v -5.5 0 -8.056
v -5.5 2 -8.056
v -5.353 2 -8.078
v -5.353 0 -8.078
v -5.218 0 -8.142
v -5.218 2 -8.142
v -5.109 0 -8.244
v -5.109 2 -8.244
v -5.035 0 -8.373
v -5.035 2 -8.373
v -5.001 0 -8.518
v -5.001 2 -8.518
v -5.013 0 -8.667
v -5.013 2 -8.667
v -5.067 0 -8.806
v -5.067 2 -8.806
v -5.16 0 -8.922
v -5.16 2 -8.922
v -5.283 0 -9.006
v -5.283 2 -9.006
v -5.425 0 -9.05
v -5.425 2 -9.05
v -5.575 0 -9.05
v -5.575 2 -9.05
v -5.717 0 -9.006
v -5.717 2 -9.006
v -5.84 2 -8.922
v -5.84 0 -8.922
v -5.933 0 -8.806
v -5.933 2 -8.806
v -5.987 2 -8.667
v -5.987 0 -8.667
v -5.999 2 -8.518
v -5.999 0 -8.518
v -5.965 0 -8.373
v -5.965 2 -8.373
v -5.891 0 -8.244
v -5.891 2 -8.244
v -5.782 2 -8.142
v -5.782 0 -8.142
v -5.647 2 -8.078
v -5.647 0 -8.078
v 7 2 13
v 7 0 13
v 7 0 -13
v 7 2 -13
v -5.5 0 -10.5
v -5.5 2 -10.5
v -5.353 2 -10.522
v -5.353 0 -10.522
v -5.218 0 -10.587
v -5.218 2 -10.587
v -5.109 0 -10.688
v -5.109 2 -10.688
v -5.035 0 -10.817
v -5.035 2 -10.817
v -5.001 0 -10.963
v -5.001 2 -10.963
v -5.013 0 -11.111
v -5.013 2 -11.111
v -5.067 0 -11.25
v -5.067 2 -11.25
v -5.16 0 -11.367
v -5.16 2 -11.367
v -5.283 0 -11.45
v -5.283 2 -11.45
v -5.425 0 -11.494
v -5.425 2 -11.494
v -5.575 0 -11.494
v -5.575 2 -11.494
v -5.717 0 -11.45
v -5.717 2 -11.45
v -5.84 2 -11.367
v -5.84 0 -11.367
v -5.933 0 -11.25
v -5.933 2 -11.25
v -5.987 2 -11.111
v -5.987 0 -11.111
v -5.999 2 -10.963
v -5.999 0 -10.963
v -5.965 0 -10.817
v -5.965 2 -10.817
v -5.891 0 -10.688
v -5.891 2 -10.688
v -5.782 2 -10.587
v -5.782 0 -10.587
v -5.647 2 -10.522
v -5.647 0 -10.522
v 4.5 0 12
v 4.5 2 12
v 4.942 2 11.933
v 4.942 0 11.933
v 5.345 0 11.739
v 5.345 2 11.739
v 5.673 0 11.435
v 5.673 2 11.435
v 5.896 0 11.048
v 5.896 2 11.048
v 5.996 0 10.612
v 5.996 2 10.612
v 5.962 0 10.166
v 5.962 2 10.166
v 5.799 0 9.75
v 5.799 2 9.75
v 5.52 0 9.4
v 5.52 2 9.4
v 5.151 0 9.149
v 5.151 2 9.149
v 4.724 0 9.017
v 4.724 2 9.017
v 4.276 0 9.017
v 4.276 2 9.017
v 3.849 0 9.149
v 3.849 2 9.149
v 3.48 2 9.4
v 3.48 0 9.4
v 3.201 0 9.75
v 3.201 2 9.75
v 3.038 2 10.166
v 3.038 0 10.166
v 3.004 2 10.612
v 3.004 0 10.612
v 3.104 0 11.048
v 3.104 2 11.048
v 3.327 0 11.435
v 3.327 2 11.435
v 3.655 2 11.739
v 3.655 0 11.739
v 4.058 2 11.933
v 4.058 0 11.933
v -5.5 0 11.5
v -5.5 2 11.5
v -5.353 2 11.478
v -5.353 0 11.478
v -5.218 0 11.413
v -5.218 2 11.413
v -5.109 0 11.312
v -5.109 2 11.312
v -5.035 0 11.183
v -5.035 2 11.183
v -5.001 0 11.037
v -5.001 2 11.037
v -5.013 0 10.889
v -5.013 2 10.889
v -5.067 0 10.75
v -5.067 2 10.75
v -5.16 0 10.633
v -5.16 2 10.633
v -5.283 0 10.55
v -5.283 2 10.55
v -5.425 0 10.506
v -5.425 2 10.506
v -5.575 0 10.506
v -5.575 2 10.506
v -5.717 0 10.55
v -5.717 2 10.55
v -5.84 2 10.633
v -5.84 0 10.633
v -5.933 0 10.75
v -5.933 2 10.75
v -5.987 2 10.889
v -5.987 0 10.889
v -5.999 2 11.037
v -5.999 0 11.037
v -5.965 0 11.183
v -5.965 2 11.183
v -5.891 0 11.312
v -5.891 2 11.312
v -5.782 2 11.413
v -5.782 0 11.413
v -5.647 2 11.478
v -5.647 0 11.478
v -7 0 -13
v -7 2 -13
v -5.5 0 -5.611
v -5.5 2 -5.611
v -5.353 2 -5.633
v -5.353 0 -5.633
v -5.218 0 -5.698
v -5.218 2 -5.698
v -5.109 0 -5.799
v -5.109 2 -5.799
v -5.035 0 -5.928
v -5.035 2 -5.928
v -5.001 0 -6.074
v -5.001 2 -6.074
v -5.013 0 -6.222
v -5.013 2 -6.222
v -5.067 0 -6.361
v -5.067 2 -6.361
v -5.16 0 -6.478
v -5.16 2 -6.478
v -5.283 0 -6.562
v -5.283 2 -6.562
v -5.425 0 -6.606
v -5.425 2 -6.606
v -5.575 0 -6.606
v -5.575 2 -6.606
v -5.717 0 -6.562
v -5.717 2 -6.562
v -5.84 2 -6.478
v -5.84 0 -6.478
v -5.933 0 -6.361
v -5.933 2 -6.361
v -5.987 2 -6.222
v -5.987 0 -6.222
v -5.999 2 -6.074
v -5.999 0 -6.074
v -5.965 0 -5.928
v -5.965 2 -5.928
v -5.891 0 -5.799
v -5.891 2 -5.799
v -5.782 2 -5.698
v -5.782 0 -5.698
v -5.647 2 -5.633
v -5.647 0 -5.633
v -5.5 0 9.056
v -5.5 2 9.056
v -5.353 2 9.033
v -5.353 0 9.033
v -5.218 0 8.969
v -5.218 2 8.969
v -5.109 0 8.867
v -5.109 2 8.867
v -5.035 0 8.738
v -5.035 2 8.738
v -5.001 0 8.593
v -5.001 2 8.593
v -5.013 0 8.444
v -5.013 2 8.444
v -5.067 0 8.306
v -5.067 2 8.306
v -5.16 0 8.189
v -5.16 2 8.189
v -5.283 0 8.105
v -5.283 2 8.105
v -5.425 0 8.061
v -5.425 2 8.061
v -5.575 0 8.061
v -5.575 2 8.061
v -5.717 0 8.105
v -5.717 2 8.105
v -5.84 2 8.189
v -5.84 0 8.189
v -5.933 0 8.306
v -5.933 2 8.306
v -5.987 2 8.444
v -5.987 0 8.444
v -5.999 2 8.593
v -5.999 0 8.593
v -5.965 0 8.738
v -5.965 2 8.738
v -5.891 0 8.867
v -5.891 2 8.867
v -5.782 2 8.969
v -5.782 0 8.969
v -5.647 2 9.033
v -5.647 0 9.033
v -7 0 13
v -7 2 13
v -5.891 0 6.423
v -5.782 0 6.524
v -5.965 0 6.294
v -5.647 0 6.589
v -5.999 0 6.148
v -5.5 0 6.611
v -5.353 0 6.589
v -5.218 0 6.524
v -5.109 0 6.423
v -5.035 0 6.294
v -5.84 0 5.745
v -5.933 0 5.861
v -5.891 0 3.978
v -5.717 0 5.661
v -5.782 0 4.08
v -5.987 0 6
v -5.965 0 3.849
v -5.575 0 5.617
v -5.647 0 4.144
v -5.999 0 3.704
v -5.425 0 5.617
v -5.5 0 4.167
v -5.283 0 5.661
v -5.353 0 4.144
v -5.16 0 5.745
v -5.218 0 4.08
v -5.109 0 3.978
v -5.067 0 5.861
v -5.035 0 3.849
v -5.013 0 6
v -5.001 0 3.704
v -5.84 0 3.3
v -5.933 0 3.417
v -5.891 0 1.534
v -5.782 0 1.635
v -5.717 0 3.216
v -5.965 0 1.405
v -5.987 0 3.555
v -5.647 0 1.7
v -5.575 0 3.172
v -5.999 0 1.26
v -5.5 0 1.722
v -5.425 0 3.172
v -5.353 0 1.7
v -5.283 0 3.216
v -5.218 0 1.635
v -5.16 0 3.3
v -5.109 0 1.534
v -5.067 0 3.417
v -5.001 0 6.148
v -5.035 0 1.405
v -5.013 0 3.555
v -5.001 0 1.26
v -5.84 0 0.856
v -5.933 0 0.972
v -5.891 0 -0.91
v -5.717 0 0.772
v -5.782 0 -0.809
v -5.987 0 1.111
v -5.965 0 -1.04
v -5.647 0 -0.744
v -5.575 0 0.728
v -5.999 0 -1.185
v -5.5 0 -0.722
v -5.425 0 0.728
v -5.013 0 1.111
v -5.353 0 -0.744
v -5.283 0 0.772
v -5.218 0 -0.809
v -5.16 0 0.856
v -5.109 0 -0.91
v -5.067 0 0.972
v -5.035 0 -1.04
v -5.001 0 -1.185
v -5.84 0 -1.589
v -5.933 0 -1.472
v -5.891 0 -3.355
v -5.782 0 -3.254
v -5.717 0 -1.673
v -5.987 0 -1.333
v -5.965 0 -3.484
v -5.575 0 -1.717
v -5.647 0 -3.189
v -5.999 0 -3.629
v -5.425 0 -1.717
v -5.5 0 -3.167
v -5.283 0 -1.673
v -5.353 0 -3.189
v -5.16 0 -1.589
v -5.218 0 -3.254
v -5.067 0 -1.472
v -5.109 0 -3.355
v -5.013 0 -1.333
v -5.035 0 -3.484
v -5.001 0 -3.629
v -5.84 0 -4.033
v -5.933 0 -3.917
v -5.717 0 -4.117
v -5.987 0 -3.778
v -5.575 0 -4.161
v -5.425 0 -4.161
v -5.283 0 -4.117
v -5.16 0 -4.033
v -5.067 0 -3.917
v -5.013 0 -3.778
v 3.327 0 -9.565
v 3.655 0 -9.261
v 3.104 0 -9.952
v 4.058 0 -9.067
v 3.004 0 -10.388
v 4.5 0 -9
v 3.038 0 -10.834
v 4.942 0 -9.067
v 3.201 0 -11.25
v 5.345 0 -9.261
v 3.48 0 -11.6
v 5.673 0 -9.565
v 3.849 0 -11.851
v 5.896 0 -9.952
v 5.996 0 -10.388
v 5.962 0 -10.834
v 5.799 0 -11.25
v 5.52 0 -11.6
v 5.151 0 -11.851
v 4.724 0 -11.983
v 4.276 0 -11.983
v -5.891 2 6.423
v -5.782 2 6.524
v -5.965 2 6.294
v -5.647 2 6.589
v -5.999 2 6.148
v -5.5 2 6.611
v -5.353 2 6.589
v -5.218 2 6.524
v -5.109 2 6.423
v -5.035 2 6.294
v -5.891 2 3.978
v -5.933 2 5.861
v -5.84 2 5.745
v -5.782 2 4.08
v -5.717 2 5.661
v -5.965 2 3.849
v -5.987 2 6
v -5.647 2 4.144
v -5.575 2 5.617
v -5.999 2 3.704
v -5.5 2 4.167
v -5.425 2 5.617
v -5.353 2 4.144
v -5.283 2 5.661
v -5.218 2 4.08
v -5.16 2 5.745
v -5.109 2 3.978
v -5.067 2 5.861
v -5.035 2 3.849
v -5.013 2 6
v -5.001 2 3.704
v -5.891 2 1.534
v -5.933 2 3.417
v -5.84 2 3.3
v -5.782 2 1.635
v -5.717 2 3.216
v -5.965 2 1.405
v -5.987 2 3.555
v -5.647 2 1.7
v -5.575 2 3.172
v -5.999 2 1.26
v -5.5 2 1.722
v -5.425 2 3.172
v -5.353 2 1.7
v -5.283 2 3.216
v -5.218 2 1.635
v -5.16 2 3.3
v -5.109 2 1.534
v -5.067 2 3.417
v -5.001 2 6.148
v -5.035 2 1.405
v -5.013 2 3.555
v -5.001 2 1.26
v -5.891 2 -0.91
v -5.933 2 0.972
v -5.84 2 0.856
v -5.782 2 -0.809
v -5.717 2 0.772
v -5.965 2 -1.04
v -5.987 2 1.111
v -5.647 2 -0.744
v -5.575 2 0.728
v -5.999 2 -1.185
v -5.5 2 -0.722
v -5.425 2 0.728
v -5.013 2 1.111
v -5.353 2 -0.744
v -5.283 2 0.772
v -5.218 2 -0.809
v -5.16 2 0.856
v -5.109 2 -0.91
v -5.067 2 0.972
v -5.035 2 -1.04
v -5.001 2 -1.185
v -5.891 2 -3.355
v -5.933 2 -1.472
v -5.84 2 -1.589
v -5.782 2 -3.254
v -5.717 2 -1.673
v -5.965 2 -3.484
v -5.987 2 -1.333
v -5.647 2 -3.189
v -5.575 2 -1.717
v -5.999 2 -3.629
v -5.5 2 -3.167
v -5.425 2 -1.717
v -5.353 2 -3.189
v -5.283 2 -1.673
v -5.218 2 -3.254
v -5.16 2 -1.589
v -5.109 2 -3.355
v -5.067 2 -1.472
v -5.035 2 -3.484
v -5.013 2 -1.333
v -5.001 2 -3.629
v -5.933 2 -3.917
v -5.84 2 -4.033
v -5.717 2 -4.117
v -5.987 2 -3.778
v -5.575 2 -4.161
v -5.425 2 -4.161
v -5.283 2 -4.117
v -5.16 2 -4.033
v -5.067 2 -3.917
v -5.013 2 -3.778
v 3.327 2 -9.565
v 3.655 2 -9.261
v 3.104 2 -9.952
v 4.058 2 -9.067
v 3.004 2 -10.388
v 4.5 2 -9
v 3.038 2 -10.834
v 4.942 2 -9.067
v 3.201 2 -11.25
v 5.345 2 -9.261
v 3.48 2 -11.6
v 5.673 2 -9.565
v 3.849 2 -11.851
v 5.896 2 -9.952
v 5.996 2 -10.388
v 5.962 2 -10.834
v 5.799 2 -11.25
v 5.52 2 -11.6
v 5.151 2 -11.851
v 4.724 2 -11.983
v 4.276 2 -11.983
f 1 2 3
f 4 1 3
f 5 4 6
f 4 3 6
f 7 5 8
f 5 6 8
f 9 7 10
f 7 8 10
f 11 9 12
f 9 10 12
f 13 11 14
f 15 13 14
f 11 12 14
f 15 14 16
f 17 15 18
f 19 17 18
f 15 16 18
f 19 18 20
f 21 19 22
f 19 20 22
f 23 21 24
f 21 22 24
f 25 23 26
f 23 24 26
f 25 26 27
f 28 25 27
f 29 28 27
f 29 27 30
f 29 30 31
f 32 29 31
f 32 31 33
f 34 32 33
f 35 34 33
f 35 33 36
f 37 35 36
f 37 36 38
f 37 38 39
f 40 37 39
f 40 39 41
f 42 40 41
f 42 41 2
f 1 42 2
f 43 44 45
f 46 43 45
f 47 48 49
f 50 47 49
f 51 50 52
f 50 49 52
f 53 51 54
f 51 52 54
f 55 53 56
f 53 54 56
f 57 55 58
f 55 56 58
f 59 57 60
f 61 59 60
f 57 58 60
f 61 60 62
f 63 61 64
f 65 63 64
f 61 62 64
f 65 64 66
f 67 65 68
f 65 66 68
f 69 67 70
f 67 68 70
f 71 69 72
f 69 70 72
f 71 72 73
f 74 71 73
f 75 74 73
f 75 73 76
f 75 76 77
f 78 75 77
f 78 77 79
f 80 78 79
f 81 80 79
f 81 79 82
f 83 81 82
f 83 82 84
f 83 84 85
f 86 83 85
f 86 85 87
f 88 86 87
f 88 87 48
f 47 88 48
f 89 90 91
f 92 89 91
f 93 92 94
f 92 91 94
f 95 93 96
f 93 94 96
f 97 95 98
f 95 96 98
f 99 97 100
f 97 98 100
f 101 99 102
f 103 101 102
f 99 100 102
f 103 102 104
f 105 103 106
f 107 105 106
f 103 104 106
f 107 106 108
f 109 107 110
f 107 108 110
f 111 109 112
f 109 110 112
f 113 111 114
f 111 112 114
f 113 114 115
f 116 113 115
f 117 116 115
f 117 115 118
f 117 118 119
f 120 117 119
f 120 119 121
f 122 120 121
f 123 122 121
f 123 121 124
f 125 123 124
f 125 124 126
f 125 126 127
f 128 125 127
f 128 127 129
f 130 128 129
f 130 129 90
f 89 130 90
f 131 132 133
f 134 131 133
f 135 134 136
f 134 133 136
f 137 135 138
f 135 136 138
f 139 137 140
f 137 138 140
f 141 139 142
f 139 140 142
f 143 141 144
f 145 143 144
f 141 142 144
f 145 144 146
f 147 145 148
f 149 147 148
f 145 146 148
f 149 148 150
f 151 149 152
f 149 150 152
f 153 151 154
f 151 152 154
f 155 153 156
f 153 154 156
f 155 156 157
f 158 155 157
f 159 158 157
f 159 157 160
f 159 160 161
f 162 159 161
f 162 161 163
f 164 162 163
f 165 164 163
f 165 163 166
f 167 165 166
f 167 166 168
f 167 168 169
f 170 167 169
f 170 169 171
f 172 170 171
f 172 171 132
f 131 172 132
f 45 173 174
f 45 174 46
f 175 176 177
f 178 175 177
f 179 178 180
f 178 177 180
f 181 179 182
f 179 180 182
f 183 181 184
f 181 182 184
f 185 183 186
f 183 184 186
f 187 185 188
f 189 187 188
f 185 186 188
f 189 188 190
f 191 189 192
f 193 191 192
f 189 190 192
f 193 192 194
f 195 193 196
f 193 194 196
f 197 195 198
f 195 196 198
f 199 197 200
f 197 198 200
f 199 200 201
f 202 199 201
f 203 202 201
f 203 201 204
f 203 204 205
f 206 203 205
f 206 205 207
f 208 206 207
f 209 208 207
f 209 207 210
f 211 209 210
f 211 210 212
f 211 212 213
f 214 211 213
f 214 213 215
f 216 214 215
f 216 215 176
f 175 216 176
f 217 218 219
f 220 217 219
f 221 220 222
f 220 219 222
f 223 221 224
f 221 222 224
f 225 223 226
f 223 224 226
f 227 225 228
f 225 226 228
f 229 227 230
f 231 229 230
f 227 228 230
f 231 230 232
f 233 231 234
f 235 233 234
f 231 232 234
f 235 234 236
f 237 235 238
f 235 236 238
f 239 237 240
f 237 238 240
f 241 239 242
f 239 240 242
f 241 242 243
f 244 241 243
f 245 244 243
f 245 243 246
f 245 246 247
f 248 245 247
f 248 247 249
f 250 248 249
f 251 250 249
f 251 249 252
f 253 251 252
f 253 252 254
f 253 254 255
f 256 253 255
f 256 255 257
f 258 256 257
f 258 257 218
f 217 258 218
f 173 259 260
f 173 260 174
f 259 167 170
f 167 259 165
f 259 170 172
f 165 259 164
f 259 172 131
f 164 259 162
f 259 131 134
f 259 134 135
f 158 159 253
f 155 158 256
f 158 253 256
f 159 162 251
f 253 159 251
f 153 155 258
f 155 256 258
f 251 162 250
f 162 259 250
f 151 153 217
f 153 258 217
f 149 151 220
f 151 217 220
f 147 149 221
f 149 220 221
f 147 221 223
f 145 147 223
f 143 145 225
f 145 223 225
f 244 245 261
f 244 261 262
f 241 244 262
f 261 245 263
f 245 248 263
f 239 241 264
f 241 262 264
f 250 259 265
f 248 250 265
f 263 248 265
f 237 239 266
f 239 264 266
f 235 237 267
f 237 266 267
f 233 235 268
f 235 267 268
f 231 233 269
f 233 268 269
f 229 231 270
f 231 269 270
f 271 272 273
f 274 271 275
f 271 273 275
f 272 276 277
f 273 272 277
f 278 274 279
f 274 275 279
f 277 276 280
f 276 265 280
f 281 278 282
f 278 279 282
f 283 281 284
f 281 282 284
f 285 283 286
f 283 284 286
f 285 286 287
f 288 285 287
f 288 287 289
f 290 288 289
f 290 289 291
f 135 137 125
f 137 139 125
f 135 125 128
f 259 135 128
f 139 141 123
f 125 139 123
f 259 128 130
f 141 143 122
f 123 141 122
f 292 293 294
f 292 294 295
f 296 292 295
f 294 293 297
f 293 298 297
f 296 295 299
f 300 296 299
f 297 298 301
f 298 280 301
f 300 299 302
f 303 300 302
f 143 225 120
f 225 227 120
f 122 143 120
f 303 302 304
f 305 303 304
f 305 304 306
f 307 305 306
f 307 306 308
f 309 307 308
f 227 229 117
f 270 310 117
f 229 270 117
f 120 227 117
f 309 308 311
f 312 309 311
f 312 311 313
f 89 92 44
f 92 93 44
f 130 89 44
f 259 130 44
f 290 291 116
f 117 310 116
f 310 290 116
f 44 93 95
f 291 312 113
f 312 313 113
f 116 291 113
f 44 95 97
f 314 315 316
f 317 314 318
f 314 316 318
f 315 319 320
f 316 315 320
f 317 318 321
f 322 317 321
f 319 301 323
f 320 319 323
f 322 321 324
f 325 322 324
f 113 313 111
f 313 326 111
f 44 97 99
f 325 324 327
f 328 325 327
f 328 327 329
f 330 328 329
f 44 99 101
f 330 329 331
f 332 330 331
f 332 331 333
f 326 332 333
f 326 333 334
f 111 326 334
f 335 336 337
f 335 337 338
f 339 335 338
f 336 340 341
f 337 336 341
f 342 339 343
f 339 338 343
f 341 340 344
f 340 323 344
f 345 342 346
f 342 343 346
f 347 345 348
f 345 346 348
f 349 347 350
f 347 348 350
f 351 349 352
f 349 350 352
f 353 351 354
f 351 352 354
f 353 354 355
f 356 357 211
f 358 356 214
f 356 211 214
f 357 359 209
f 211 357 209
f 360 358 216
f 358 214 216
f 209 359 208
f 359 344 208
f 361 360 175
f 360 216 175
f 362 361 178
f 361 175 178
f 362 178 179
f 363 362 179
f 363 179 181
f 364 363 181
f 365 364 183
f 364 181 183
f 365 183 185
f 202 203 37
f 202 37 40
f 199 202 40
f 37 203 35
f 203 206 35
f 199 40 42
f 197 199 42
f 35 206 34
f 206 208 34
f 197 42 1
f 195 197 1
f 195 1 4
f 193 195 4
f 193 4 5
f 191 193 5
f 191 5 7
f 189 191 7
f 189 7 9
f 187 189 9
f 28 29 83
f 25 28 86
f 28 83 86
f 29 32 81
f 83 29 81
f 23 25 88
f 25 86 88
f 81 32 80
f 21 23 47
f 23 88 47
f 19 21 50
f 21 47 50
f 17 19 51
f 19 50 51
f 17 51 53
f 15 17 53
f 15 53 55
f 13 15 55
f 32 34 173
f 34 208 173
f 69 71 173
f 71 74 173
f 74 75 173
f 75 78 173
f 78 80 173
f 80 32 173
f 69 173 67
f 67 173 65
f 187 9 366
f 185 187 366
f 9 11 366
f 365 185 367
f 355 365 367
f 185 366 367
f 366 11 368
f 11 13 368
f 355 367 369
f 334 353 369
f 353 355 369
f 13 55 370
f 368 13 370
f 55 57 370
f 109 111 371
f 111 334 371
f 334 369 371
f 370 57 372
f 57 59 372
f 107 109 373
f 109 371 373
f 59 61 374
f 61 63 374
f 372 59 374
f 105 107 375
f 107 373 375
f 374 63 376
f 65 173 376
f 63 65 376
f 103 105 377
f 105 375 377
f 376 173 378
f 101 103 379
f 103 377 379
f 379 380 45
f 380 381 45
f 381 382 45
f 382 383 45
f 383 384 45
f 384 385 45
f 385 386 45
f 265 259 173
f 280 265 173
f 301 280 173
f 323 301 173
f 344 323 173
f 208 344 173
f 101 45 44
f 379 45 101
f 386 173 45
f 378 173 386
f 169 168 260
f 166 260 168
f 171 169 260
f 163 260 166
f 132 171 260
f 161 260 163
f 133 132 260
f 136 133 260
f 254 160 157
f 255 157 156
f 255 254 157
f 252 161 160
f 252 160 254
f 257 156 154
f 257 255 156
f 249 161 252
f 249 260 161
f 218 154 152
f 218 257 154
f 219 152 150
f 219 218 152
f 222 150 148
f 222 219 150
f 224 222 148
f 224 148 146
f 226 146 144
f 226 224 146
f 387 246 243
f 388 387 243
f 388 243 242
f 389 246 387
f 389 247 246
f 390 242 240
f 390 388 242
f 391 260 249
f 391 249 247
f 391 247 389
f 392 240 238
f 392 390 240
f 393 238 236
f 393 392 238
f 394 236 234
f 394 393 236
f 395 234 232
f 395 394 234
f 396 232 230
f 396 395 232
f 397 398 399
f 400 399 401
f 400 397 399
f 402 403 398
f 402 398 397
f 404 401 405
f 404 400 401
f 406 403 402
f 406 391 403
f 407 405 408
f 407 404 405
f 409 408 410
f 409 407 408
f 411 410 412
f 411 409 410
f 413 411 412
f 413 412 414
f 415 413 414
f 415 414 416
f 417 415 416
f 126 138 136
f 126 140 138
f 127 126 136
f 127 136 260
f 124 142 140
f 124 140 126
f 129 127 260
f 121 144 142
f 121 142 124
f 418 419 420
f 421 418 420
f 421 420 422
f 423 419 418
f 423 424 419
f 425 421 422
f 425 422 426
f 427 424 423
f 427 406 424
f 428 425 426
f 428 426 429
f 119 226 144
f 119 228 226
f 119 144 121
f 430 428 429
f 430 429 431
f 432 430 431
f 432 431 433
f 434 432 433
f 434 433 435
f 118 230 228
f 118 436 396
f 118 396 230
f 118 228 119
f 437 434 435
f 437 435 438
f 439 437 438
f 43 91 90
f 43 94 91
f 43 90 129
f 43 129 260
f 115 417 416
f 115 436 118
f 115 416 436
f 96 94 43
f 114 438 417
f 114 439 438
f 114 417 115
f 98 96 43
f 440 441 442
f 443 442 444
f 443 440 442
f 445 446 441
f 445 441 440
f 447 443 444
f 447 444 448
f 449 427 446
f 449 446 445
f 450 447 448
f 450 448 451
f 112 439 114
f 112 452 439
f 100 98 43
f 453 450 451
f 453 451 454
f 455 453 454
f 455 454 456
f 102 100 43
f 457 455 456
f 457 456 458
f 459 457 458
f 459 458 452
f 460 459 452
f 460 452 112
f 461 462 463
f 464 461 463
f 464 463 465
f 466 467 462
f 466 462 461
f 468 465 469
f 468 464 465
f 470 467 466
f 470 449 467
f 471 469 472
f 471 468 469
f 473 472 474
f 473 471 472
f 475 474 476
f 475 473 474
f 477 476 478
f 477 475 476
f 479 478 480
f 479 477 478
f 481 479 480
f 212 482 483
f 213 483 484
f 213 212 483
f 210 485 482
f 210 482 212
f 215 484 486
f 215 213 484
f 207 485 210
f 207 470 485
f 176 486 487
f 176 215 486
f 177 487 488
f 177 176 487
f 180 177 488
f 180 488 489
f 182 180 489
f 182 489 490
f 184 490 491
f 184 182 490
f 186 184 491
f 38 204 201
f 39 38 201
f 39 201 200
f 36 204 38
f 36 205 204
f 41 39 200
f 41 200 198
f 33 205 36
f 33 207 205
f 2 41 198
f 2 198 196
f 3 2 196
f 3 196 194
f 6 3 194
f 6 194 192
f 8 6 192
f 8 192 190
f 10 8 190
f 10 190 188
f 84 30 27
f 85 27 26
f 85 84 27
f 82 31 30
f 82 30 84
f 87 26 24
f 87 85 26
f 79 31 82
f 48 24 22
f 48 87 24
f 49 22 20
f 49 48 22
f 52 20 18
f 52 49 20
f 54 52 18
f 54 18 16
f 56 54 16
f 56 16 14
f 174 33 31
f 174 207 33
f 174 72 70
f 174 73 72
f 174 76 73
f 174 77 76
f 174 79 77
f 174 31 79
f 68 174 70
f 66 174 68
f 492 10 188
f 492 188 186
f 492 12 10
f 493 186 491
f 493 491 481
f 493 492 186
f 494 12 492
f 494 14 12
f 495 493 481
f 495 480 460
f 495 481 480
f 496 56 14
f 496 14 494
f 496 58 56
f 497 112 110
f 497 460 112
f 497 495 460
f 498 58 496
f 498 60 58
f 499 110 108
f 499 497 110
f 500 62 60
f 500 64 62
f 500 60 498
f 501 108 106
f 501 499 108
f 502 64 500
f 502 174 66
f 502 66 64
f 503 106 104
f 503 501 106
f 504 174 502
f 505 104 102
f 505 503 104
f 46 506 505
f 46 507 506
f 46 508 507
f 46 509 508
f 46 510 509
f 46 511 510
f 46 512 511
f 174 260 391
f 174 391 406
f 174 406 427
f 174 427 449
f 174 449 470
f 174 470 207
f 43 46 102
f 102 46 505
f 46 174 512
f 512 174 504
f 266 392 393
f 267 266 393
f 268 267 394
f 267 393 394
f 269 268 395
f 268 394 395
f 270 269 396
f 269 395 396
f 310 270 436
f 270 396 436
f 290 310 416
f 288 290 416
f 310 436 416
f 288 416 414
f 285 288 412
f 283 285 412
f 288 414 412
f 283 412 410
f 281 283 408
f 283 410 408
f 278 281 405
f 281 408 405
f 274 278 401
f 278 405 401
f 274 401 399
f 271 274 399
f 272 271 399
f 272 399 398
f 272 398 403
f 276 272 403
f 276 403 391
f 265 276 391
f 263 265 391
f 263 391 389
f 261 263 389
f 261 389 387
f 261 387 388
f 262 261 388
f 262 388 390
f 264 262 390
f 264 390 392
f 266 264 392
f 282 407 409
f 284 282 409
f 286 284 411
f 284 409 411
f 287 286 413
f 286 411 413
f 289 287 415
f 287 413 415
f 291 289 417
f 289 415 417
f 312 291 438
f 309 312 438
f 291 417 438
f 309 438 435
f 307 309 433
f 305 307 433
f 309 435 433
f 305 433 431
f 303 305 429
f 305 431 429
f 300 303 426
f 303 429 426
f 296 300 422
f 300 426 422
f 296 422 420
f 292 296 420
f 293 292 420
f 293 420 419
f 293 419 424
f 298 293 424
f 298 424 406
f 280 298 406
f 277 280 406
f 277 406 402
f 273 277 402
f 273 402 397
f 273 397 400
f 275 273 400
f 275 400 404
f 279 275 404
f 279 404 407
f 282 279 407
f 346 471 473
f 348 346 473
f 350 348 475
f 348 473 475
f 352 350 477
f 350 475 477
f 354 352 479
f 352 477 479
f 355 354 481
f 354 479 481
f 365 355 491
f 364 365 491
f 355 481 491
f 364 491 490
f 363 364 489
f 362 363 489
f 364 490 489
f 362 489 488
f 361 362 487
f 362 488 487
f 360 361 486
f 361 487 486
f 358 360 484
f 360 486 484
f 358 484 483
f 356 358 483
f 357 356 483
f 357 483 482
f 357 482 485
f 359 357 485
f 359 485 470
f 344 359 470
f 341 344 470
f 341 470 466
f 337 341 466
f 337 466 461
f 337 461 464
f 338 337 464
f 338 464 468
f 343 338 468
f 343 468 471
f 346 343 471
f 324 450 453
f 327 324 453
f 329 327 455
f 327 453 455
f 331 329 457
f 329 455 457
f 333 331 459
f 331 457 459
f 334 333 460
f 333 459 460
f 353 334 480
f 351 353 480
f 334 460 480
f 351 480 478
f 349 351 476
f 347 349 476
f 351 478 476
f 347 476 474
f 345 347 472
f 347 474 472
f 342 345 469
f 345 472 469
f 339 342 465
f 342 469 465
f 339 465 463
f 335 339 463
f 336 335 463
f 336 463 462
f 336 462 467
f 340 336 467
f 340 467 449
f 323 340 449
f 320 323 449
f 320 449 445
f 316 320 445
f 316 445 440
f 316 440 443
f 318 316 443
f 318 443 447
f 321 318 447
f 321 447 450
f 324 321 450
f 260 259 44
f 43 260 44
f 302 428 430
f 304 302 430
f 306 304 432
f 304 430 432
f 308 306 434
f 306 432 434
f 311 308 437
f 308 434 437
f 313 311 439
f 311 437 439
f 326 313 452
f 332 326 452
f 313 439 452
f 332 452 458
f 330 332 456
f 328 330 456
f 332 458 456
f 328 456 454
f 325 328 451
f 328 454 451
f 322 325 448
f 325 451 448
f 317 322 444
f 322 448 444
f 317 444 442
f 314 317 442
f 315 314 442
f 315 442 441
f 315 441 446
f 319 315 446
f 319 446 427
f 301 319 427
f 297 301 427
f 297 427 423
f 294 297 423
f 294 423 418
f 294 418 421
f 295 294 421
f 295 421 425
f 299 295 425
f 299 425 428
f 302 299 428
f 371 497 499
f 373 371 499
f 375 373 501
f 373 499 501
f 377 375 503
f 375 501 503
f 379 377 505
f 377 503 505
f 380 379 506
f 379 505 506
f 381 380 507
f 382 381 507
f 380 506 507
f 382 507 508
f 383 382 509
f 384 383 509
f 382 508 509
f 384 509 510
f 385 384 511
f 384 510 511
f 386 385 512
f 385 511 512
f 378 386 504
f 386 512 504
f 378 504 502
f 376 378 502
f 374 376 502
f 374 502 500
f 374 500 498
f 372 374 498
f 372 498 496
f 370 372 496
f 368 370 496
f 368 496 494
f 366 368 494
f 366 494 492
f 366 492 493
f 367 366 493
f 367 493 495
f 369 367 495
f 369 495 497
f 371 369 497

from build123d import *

# Parameters (mm, degrees)
SKETCH1_W           = 14
SKETCH1_H           = 26
BOSS_EXTRUDE1_DEPTH = 2
SKETCH2_R           = 1.5
CUT_EXTRUDE1_DEPTH  = 15.899664426
SKETCH3_R           = 0.5
CUT_EXTRUDE2_DEPTH  = 15.899664426


with BuildPart() as part:
    # Sketch1 → Boss-Extrude1 (new body)
    with BuildSketch(Plane(origin=(0, 0, 0), x_dir=(1, 0, 0), z_dir=(0, 1, 0))):
        Rectangle(SKETCH1_W, SKETCH1_H)
    extrude(amount=BOSS_EXTRUDE1_DEPTH)

    # Sketch2 → Cut-Extrude1 (cut, through all)
    with BuildSketch(Plane(origin=(0, 2, 0), x_dir=(1, 0, 0), z_dir=(0, 1, 0))):
        with Locations((4.5, 10.5)):
            Circle(SKETCH2_R)
        with Locations((4.5, -10.5)):
            Circle(SKETCH2_R)
    extrude(amount=-CUT_EXTRUDE1_DEPTH, mode=Mode.SUBTRACT)

    # Sketch3 → Cut-Extrude2 (cut, through all)
    with BuildSketch(Plane(origin=(0, 2, 0), x_dir=(1, 0, 0), z_dir=(0, 1, 0))):
        with Locations((-5.5, 11)):
            Circle(SKETCH3_R)
        with Locations((-5.5, 8.555556)):
            Circle(SKETCH3_R)
        with Locations((-5.5, 6.111112)):
            Circle(SKETCH3_R)
        with Locations((-5.5, 3.666668)):
            Circle(SKETCH3_R)
        with Locations((-5.5, 1.222224)):
            Circle(SKETCH3_R)
        with Locations((-5.5, -1.22222)):
            Circle(SKETCH3_R)
        with Locations((-5.5, -3.666664)):
            Circle(SKETCH3_R)
        with Locations((-5.5, -6.111108)):
            Circle(SKETCH3_R)
        with Locations((-5.5, -8.555552)):
            Circle(SKETCH3_R)
        with Locations((-5.5, -10.999996)):
            Circle(SKETCH3_R)
    extrude(amount=-CUT_EXTRUDE2_DEPTH, mode=Mode.SUBTRACT)


solid = part.part
